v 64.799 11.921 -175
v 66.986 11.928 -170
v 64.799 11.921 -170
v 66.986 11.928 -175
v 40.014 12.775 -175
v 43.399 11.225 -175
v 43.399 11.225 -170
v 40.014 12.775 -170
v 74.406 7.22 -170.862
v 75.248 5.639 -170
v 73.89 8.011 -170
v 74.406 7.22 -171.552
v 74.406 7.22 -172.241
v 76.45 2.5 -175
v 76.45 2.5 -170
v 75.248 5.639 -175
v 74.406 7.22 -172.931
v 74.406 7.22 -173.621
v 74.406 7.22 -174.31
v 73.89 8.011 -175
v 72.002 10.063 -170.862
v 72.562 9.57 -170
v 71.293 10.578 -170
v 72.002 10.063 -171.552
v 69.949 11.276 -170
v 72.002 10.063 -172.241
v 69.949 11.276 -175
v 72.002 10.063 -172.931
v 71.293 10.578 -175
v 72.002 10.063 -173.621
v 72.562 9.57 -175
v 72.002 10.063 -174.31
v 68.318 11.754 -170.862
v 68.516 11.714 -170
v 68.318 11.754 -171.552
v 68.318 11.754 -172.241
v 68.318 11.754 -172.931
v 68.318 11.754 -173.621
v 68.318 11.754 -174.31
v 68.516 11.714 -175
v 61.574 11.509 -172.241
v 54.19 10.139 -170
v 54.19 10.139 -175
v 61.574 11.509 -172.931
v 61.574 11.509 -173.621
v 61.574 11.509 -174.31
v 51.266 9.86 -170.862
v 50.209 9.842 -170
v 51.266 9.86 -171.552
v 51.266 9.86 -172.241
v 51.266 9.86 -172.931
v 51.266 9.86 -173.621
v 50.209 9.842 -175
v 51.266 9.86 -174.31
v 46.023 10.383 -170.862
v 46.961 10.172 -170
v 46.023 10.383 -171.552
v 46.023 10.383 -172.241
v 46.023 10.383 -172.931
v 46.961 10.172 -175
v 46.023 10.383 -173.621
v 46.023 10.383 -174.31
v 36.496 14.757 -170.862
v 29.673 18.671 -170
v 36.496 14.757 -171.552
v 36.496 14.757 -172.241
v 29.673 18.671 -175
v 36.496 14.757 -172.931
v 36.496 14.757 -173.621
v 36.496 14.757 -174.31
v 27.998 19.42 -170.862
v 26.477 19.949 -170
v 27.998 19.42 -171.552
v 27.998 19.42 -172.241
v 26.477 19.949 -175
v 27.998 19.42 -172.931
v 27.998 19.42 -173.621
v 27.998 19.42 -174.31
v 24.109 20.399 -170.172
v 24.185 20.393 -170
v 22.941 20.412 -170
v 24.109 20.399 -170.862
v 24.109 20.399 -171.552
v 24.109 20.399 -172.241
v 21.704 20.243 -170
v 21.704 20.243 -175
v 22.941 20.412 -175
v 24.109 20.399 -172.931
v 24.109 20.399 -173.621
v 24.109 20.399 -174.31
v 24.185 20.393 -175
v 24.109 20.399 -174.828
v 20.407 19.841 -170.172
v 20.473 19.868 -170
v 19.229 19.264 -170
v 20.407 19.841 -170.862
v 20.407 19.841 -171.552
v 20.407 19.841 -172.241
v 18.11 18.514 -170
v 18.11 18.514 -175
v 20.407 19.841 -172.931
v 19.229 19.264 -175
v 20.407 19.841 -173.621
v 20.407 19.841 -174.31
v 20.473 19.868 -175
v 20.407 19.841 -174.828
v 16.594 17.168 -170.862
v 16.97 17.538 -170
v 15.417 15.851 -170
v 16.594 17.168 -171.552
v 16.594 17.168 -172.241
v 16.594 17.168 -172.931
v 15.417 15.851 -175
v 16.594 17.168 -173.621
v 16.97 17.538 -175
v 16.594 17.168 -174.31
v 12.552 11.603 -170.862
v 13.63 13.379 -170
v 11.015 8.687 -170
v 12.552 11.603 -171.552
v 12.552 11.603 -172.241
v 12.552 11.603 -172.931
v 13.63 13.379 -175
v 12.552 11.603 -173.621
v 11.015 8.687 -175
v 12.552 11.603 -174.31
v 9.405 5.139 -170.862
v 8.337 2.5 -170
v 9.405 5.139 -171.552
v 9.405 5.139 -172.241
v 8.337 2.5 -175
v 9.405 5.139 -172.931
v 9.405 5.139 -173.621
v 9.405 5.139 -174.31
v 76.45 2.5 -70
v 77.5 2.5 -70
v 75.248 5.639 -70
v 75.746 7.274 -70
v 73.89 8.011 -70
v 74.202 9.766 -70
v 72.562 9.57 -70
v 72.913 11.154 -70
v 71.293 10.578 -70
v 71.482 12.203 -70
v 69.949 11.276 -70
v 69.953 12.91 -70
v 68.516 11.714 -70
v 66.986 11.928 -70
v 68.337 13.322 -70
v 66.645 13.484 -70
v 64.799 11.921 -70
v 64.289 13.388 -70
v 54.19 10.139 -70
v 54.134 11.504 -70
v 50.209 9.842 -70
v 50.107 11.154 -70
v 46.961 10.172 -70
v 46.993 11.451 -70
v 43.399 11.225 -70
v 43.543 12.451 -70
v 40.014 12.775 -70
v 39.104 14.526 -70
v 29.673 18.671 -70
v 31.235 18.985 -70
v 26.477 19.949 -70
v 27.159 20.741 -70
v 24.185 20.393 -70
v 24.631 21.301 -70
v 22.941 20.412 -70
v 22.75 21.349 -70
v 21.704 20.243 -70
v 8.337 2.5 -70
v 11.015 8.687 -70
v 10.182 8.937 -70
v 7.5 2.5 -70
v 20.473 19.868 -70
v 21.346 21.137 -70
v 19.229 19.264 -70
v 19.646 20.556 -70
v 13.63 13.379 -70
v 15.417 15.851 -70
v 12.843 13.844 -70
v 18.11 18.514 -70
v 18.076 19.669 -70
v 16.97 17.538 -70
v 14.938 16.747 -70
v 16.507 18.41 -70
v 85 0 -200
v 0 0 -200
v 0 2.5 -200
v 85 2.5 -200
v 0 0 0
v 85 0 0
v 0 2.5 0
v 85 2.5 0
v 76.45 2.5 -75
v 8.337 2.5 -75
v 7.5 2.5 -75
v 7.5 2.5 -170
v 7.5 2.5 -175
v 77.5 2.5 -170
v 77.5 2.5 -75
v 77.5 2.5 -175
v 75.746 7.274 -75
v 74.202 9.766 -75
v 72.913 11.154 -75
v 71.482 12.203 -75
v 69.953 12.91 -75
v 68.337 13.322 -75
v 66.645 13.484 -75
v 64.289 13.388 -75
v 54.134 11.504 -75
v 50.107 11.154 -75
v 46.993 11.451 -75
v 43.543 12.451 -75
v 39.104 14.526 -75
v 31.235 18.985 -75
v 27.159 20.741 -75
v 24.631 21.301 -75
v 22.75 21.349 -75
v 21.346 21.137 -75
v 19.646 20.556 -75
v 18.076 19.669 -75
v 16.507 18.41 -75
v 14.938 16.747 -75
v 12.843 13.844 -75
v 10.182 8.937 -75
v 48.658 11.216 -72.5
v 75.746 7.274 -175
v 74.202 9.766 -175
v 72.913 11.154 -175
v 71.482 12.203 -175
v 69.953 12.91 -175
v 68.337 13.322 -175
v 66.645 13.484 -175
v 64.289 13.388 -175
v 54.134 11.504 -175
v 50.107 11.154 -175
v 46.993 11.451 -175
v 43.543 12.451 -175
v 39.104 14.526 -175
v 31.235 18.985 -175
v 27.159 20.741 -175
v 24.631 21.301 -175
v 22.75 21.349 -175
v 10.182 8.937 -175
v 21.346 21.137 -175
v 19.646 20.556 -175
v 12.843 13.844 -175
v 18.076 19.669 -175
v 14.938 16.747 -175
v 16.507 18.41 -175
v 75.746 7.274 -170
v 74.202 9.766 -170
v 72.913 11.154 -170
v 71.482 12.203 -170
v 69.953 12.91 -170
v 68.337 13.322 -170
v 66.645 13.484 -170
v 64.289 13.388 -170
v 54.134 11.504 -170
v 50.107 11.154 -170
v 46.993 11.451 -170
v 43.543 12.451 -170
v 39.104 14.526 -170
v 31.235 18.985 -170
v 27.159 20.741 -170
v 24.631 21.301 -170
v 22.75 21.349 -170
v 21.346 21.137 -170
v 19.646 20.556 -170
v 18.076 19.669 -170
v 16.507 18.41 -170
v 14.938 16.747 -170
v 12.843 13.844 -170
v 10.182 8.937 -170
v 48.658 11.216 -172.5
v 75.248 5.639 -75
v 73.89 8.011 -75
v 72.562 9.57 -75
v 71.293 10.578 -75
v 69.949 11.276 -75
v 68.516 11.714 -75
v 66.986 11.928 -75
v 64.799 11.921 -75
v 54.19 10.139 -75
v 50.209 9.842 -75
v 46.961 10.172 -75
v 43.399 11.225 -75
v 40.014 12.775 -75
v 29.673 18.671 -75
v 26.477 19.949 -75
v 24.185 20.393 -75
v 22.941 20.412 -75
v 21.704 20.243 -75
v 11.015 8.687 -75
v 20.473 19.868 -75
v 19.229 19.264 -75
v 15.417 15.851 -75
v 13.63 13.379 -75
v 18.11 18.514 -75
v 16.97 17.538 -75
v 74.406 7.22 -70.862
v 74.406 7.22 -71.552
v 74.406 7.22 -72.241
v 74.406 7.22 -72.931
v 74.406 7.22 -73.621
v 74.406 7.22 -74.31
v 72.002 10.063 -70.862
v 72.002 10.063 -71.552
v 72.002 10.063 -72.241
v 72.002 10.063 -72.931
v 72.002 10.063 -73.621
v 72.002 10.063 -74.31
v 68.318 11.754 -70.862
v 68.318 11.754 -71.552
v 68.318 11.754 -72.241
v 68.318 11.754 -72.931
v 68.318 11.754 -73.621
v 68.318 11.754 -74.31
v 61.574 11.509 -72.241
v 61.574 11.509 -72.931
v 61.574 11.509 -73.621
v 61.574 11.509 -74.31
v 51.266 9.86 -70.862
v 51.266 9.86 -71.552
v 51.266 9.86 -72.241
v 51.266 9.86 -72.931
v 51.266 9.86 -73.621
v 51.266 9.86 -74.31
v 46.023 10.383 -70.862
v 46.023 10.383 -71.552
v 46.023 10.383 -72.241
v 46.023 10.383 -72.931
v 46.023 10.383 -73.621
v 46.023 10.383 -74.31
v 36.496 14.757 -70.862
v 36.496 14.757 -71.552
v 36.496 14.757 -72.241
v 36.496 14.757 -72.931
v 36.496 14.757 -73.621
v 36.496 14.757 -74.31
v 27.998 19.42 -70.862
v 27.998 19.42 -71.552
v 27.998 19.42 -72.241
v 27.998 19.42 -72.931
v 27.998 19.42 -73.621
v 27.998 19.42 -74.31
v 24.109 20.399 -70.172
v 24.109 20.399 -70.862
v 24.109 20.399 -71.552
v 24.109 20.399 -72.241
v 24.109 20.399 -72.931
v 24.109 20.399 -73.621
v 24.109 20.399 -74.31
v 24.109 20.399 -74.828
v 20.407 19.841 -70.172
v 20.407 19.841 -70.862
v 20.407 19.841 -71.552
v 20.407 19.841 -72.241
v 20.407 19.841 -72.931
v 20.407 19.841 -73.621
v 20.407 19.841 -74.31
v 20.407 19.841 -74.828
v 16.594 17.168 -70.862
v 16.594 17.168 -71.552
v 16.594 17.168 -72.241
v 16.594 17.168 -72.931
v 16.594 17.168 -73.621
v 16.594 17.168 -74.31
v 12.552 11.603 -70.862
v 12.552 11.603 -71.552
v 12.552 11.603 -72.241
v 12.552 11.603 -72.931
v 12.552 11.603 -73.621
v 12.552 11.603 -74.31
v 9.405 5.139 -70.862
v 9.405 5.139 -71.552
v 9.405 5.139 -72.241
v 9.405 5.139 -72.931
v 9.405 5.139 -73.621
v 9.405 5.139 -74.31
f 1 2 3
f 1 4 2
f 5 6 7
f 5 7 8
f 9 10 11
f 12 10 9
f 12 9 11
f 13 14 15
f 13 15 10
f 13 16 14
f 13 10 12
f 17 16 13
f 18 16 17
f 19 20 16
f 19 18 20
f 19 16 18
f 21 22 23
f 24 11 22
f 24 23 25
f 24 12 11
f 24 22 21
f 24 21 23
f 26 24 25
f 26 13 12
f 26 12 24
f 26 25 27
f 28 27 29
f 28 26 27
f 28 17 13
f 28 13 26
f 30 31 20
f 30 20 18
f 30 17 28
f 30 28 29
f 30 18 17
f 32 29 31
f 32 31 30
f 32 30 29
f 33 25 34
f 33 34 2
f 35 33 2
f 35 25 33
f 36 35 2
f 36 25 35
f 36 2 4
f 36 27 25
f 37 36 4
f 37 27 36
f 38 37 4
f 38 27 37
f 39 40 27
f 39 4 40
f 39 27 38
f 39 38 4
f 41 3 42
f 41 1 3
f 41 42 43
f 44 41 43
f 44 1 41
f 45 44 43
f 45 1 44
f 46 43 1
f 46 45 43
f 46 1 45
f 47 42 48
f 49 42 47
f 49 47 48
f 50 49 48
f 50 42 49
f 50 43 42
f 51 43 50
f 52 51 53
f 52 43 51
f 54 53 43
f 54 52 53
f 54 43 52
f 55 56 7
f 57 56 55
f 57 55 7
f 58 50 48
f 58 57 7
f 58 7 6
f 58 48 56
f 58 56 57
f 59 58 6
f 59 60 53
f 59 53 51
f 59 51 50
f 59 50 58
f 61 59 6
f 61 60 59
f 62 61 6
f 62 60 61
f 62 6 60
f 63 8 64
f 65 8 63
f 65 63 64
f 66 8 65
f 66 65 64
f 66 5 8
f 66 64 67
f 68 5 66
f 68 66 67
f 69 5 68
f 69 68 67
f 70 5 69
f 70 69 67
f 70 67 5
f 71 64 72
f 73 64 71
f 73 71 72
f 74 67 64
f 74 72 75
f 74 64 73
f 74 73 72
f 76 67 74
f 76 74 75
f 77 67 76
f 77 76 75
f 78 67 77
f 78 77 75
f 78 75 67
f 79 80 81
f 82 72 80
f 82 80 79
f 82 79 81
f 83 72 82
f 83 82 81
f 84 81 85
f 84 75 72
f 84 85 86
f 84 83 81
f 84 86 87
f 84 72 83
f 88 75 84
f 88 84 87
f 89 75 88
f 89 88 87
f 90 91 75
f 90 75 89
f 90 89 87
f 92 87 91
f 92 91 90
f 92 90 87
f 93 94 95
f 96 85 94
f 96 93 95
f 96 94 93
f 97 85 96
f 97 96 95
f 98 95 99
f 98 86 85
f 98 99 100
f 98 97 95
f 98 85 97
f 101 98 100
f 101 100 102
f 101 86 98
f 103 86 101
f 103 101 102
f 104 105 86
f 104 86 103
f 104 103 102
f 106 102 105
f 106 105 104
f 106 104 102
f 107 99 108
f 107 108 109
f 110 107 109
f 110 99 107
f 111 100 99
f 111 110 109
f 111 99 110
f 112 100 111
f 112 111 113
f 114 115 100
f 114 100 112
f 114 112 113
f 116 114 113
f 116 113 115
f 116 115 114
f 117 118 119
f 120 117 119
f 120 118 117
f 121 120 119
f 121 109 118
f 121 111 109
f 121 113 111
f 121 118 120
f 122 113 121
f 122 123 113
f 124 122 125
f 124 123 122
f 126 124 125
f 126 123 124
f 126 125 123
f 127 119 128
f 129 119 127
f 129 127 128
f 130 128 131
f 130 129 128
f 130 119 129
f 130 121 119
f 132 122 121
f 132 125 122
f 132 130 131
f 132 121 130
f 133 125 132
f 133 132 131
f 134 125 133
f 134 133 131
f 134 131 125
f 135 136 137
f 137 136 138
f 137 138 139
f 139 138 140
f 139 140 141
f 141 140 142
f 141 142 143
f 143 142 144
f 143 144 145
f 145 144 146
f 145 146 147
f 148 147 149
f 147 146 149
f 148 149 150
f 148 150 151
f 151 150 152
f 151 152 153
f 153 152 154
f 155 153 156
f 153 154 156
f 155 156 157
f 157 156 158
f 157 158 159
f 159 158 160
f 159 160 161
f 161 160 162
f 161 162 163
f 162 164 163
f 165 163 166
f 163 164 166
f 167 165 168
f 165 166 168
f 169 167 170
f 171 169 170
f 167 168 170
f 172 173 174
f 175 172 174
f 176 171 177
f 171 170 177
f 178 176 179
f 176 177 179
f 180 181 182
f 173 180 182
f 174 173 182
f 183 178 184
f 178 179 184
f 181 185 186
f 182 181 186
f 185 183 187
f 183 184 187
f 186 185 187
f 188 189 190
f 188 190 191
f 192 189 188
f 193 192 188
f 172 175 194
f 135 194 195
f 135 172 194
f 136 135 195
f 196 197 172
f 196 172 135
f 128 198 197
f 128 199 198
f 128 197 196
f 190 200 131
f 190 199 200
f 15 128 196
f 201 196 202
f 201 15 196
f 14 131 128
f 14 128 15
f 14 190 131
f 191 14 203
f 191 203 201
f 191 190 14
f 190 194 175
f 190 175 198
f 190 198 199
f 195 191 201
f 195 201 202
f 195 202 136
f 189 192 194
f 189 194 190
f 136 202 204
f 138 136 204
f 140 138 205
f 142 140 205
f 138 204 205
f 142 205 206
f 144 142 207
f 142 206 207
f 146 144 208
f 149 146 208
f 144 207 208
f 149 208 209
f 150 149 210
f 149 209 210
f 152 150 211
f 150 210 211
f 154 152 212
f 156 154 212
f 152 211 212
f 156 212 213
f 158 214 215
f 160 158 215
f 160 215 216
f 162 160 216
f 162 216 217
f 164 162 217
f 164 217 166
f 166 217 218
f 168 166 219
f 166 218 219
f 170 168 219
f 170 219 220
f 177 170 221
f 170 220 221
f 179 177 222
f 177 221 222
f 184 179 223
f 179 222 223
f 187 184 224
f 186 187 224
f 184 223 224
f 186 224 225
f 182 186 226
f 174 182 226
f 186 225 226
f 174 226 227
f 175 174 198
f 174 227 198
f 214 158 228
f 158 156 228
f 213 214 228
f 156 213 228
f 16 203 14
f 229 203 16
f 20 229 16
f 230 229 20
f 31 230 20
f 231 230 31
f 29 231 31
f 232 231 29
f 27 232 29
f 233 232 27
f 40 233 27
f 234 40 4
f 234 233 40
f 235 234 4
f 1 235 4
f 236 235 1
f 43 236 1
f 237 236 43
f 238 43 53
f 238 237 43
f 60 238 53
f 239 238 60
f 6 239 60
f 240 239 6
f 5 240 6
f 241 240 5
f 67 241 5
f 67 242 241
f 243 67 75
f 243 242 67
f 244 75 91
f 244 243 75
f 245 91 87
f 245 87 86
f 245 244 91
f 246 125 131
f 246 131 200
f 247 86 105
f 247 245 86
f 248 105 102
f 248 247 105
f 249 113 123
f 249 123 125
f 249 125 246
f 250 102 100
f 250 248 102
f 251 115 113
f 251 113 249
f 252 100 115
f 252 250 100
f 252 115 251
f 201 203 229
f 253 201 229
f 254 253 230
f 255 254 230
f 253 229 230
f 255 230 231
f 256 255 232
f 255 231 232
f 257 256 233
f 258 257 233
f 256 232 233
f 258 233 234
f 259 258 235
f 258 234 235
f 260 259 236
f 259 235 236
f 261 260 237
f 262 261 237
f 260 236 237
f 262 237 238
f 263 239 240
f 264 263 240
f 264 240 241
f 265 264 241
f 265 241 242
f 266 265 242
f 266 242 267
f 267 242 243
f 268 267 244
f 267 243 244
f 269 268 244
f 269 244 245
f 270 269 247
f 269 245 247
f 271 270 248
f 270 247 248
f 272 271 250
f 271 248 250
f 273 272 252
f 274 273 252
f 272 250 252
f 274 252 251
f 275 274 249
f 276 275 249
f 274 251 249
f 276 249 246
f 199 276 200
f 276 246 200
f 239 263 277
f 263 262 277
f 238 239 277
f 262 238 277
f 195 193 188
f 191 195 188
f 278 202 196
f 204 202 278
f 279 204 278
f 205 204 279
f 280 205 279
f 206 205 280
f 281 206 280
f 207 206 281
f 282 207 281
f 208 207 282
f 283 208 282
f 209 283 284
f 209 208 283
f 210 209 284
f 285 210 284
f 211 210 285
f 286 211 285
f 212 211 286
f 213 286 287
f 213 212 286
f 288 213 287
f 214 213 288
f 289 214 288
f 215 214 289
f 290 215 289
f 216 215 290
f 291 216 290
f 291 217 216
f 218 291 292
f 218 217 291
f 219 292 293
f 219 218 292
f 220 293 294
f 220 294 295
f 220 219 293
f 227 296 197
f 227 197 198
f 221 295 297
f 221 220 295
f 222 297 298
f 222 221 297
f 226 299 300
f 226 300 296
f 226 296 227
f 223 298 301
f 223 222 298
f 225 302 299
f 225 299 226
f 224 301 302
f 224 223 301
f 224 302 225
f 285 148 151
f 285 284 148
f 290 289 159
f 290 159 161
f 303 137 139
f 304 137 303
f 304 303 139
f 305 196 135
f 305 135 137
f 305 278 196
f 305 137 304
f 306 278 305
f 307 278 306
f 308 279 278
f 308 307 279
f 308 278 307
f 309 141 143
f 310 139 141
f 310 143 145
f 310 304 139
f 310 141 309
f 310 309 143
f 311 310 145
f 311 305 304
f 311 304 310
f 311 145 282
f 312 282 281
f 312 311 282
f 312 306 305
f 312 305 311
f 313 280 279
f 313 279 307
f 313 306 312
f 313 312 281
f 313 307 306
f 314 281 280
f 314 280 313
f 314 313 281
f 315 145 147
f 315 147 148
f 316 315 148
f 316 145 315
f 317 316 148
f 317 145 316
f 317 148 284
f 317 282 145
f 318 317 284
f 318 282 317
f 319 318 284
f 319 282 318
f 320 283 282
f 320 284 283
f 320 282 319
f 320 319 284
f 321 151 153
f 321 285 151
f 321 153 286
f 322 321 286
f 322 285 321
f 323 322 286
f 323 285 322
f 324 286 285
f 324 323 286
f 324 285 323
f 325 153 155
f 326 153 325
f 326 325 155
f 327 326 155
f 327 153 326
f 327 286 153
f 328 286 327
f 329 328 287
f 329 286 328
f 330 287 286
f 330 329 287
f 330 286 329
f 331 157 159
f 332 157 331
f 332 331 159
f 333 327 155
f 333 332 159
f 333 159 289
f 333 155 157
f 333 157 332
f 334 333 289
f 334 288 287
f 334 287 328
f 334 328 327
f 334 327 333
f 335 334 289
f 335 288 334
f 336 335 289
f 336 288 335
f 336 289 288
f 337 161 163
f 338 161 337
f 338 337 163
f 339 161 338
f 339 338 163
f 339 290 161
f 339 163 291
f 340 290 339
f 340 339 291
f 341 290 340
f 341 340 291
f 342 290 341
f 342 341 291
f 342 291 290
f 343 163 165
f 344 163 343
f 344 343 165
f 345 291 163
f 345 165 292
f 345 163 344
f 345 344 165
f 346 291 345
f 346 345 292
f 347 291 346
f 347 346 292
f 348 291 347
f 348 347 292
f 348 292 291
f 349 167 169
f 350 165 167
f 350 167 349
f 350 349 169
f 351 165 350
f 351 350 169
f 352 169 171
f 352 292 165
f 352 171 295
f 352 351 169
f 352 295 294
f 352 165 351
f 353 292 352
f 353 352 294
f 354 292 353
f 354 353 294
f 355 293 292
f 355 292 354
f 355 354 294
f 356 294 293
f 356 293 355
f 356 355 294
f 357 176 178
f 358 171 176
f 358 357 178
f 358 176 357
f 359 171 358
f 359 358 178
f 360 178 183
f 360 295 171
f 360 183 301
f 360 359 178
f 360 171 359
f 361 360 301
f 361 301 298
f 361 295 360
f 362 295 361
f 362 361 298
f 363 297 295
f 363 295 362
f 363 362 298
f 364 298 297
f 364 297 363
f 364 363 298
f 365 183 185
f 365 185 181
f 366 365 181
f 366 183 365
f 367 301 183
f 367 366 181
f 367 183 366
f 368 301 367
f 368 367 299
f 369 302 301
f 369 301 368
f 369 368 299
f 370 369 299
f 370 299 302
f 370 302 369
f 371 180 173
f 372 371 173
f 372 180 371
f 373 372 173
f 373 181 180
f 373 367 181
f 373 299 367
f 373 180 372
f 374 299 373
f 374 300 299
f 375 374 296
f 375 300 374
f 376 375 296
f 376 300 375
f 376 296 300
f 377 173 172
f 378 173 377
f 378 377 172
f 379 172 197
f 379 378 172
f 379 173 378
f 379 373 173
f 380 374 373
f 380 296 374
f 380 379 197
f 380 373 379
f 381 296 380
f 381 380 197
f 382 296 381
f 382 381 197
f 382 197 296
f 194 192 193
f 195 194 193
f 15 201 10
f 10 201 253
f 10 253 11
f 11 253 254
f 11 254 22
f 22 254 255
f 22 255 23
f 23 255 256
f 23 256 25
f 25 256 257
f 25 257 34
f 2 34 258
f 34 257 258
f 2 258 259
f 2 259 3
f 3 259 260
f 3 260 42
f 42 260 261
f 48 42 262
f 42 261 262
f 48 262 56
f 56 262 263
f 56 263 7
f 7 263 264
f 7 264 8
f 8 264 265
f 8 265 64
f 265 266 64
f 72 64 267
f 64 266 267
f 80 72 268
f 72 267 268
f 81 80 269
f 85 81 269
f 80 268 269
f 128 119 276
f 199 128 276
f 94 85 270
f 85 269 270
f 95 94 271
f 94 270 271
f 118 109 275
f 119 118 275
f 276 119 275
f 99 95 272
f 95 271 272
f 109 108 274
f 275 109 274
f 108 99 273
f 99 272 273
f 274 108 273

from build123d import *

# Parameters (mm, degrees)
SKETCH1_W           = 85
SKETCH1_H           = 200
BOSS_EXTRUDE1_DEPTH = 2.5
BOSS_EXTRUDE3_DEPTH = 5
LPATTERN1_COUNT     = 2
LPATTERN1_PITCH     = 100


with BuildPart() as part:
    # Sketch1 → Boss-Extrude1 (new body)
    with BuildSketch(Plane(origin=(0, 0, 0), x_dir=(1, 0, 0), z_dir=(0, 1, 0))):
        with Locations((42.5, 100)):
            Rectangle(SKETCH1_W, SKETCH1_H)
    extrude(amount=BOSS_EXTRUDE1_DEPTH)

    # Sketch3 → Boss-Extrude3 (add)
    with BuildSketch(Plane(origin=(0, 0, -175), x_dir=(-1, 0, 0), z_dir=(0, 0, -1))):
        with BuildLine():
            Line((-77.5, 2.5), (-76.450132059, 2.5))
            add(Edge.make_bspline(
                [(-76.450132059, 2.5), (-76.352037023, 2.813155952), (-76.141653781, 3.448774979), (-75.712920238, 4.60640845), (-75.141711698, 5.914949297), (-74.412627596, 7.255247487), (-73.387535674, 8.763975464), (-72.02254847, 10.166201705), (-70.263673421, 11.232606933), (-68.348427729, 11.819901852), (-65.552395249, 12.079641822), (-61.64077912, 11.600566429), (-56.547104343, 10.479098709), (-52.154053067, 9.794168924), (-48.61006882, 9.853555219), (-45.138239485, 10.48501356), (-41.055154093, 12.11371223), (-36.455574443, 14.746231277), (-32.098424566, 17.443496584), (-27.955000453, 19.605965858), (-24.067408798, 20.651525579), (-21.036519902, 20.26070597), (-18.540531077, 18.923836601), (-16.603695352, 17.289307939), (-14.606368482, 14.925983967), (-12.900683609, 12.280076139), (-11.514973715, 9.719991389), (-10.466169356, 7.570851399), (-9.58244987, 5.576333061), (-8.874263801, 3.865936613), (-8.511972004, 2.951657976), (-8.336705052, 2.5)],
                knots=[0, 0, 0, 0, 0.0078125, 0.015625, 0.03125, 0.046875, 0.0625, 0.09375, 0.125, 0.15625, 0.1875, 0.25, 0.3125, 0.375, 0.40625, 0.4375, 0.5, 0.5625, 0.625, 0.6875, 0.75, 0.8125, 0.84375, 0.875, 0.90625, 0.9375, 0.953125, 0.96875, 0.984375, 0.9921875, 1, 1, 1, 1], degree=3))
            Line((-8.336705052, 2.5), (-7.5, 2.5))
            add(Edge.make_bspline(
                [(-77.5, 2.5), (-72.458418192, 21.091936155), (-41.386339311, -5.263286213), (-20.750377369, 38.155046939), (-7.5, 2.5)],
                knots=[0, 0, 0, 0, 0.411408499, 1, 1, 1, 1], degree=3))
        make_face()
    boss_extrude3 = extrude(amount=-BOSS_EXTRUDE3_DEPTH)

    # LPattern1: Boss-Extrude3 ×2
    with Locations(*[(0, 0, i * LPATTERN1_PITCH) for i in range(1, LPATTERN1_COUNT)]):
        add(boss_extrude3)


solid = part.part
